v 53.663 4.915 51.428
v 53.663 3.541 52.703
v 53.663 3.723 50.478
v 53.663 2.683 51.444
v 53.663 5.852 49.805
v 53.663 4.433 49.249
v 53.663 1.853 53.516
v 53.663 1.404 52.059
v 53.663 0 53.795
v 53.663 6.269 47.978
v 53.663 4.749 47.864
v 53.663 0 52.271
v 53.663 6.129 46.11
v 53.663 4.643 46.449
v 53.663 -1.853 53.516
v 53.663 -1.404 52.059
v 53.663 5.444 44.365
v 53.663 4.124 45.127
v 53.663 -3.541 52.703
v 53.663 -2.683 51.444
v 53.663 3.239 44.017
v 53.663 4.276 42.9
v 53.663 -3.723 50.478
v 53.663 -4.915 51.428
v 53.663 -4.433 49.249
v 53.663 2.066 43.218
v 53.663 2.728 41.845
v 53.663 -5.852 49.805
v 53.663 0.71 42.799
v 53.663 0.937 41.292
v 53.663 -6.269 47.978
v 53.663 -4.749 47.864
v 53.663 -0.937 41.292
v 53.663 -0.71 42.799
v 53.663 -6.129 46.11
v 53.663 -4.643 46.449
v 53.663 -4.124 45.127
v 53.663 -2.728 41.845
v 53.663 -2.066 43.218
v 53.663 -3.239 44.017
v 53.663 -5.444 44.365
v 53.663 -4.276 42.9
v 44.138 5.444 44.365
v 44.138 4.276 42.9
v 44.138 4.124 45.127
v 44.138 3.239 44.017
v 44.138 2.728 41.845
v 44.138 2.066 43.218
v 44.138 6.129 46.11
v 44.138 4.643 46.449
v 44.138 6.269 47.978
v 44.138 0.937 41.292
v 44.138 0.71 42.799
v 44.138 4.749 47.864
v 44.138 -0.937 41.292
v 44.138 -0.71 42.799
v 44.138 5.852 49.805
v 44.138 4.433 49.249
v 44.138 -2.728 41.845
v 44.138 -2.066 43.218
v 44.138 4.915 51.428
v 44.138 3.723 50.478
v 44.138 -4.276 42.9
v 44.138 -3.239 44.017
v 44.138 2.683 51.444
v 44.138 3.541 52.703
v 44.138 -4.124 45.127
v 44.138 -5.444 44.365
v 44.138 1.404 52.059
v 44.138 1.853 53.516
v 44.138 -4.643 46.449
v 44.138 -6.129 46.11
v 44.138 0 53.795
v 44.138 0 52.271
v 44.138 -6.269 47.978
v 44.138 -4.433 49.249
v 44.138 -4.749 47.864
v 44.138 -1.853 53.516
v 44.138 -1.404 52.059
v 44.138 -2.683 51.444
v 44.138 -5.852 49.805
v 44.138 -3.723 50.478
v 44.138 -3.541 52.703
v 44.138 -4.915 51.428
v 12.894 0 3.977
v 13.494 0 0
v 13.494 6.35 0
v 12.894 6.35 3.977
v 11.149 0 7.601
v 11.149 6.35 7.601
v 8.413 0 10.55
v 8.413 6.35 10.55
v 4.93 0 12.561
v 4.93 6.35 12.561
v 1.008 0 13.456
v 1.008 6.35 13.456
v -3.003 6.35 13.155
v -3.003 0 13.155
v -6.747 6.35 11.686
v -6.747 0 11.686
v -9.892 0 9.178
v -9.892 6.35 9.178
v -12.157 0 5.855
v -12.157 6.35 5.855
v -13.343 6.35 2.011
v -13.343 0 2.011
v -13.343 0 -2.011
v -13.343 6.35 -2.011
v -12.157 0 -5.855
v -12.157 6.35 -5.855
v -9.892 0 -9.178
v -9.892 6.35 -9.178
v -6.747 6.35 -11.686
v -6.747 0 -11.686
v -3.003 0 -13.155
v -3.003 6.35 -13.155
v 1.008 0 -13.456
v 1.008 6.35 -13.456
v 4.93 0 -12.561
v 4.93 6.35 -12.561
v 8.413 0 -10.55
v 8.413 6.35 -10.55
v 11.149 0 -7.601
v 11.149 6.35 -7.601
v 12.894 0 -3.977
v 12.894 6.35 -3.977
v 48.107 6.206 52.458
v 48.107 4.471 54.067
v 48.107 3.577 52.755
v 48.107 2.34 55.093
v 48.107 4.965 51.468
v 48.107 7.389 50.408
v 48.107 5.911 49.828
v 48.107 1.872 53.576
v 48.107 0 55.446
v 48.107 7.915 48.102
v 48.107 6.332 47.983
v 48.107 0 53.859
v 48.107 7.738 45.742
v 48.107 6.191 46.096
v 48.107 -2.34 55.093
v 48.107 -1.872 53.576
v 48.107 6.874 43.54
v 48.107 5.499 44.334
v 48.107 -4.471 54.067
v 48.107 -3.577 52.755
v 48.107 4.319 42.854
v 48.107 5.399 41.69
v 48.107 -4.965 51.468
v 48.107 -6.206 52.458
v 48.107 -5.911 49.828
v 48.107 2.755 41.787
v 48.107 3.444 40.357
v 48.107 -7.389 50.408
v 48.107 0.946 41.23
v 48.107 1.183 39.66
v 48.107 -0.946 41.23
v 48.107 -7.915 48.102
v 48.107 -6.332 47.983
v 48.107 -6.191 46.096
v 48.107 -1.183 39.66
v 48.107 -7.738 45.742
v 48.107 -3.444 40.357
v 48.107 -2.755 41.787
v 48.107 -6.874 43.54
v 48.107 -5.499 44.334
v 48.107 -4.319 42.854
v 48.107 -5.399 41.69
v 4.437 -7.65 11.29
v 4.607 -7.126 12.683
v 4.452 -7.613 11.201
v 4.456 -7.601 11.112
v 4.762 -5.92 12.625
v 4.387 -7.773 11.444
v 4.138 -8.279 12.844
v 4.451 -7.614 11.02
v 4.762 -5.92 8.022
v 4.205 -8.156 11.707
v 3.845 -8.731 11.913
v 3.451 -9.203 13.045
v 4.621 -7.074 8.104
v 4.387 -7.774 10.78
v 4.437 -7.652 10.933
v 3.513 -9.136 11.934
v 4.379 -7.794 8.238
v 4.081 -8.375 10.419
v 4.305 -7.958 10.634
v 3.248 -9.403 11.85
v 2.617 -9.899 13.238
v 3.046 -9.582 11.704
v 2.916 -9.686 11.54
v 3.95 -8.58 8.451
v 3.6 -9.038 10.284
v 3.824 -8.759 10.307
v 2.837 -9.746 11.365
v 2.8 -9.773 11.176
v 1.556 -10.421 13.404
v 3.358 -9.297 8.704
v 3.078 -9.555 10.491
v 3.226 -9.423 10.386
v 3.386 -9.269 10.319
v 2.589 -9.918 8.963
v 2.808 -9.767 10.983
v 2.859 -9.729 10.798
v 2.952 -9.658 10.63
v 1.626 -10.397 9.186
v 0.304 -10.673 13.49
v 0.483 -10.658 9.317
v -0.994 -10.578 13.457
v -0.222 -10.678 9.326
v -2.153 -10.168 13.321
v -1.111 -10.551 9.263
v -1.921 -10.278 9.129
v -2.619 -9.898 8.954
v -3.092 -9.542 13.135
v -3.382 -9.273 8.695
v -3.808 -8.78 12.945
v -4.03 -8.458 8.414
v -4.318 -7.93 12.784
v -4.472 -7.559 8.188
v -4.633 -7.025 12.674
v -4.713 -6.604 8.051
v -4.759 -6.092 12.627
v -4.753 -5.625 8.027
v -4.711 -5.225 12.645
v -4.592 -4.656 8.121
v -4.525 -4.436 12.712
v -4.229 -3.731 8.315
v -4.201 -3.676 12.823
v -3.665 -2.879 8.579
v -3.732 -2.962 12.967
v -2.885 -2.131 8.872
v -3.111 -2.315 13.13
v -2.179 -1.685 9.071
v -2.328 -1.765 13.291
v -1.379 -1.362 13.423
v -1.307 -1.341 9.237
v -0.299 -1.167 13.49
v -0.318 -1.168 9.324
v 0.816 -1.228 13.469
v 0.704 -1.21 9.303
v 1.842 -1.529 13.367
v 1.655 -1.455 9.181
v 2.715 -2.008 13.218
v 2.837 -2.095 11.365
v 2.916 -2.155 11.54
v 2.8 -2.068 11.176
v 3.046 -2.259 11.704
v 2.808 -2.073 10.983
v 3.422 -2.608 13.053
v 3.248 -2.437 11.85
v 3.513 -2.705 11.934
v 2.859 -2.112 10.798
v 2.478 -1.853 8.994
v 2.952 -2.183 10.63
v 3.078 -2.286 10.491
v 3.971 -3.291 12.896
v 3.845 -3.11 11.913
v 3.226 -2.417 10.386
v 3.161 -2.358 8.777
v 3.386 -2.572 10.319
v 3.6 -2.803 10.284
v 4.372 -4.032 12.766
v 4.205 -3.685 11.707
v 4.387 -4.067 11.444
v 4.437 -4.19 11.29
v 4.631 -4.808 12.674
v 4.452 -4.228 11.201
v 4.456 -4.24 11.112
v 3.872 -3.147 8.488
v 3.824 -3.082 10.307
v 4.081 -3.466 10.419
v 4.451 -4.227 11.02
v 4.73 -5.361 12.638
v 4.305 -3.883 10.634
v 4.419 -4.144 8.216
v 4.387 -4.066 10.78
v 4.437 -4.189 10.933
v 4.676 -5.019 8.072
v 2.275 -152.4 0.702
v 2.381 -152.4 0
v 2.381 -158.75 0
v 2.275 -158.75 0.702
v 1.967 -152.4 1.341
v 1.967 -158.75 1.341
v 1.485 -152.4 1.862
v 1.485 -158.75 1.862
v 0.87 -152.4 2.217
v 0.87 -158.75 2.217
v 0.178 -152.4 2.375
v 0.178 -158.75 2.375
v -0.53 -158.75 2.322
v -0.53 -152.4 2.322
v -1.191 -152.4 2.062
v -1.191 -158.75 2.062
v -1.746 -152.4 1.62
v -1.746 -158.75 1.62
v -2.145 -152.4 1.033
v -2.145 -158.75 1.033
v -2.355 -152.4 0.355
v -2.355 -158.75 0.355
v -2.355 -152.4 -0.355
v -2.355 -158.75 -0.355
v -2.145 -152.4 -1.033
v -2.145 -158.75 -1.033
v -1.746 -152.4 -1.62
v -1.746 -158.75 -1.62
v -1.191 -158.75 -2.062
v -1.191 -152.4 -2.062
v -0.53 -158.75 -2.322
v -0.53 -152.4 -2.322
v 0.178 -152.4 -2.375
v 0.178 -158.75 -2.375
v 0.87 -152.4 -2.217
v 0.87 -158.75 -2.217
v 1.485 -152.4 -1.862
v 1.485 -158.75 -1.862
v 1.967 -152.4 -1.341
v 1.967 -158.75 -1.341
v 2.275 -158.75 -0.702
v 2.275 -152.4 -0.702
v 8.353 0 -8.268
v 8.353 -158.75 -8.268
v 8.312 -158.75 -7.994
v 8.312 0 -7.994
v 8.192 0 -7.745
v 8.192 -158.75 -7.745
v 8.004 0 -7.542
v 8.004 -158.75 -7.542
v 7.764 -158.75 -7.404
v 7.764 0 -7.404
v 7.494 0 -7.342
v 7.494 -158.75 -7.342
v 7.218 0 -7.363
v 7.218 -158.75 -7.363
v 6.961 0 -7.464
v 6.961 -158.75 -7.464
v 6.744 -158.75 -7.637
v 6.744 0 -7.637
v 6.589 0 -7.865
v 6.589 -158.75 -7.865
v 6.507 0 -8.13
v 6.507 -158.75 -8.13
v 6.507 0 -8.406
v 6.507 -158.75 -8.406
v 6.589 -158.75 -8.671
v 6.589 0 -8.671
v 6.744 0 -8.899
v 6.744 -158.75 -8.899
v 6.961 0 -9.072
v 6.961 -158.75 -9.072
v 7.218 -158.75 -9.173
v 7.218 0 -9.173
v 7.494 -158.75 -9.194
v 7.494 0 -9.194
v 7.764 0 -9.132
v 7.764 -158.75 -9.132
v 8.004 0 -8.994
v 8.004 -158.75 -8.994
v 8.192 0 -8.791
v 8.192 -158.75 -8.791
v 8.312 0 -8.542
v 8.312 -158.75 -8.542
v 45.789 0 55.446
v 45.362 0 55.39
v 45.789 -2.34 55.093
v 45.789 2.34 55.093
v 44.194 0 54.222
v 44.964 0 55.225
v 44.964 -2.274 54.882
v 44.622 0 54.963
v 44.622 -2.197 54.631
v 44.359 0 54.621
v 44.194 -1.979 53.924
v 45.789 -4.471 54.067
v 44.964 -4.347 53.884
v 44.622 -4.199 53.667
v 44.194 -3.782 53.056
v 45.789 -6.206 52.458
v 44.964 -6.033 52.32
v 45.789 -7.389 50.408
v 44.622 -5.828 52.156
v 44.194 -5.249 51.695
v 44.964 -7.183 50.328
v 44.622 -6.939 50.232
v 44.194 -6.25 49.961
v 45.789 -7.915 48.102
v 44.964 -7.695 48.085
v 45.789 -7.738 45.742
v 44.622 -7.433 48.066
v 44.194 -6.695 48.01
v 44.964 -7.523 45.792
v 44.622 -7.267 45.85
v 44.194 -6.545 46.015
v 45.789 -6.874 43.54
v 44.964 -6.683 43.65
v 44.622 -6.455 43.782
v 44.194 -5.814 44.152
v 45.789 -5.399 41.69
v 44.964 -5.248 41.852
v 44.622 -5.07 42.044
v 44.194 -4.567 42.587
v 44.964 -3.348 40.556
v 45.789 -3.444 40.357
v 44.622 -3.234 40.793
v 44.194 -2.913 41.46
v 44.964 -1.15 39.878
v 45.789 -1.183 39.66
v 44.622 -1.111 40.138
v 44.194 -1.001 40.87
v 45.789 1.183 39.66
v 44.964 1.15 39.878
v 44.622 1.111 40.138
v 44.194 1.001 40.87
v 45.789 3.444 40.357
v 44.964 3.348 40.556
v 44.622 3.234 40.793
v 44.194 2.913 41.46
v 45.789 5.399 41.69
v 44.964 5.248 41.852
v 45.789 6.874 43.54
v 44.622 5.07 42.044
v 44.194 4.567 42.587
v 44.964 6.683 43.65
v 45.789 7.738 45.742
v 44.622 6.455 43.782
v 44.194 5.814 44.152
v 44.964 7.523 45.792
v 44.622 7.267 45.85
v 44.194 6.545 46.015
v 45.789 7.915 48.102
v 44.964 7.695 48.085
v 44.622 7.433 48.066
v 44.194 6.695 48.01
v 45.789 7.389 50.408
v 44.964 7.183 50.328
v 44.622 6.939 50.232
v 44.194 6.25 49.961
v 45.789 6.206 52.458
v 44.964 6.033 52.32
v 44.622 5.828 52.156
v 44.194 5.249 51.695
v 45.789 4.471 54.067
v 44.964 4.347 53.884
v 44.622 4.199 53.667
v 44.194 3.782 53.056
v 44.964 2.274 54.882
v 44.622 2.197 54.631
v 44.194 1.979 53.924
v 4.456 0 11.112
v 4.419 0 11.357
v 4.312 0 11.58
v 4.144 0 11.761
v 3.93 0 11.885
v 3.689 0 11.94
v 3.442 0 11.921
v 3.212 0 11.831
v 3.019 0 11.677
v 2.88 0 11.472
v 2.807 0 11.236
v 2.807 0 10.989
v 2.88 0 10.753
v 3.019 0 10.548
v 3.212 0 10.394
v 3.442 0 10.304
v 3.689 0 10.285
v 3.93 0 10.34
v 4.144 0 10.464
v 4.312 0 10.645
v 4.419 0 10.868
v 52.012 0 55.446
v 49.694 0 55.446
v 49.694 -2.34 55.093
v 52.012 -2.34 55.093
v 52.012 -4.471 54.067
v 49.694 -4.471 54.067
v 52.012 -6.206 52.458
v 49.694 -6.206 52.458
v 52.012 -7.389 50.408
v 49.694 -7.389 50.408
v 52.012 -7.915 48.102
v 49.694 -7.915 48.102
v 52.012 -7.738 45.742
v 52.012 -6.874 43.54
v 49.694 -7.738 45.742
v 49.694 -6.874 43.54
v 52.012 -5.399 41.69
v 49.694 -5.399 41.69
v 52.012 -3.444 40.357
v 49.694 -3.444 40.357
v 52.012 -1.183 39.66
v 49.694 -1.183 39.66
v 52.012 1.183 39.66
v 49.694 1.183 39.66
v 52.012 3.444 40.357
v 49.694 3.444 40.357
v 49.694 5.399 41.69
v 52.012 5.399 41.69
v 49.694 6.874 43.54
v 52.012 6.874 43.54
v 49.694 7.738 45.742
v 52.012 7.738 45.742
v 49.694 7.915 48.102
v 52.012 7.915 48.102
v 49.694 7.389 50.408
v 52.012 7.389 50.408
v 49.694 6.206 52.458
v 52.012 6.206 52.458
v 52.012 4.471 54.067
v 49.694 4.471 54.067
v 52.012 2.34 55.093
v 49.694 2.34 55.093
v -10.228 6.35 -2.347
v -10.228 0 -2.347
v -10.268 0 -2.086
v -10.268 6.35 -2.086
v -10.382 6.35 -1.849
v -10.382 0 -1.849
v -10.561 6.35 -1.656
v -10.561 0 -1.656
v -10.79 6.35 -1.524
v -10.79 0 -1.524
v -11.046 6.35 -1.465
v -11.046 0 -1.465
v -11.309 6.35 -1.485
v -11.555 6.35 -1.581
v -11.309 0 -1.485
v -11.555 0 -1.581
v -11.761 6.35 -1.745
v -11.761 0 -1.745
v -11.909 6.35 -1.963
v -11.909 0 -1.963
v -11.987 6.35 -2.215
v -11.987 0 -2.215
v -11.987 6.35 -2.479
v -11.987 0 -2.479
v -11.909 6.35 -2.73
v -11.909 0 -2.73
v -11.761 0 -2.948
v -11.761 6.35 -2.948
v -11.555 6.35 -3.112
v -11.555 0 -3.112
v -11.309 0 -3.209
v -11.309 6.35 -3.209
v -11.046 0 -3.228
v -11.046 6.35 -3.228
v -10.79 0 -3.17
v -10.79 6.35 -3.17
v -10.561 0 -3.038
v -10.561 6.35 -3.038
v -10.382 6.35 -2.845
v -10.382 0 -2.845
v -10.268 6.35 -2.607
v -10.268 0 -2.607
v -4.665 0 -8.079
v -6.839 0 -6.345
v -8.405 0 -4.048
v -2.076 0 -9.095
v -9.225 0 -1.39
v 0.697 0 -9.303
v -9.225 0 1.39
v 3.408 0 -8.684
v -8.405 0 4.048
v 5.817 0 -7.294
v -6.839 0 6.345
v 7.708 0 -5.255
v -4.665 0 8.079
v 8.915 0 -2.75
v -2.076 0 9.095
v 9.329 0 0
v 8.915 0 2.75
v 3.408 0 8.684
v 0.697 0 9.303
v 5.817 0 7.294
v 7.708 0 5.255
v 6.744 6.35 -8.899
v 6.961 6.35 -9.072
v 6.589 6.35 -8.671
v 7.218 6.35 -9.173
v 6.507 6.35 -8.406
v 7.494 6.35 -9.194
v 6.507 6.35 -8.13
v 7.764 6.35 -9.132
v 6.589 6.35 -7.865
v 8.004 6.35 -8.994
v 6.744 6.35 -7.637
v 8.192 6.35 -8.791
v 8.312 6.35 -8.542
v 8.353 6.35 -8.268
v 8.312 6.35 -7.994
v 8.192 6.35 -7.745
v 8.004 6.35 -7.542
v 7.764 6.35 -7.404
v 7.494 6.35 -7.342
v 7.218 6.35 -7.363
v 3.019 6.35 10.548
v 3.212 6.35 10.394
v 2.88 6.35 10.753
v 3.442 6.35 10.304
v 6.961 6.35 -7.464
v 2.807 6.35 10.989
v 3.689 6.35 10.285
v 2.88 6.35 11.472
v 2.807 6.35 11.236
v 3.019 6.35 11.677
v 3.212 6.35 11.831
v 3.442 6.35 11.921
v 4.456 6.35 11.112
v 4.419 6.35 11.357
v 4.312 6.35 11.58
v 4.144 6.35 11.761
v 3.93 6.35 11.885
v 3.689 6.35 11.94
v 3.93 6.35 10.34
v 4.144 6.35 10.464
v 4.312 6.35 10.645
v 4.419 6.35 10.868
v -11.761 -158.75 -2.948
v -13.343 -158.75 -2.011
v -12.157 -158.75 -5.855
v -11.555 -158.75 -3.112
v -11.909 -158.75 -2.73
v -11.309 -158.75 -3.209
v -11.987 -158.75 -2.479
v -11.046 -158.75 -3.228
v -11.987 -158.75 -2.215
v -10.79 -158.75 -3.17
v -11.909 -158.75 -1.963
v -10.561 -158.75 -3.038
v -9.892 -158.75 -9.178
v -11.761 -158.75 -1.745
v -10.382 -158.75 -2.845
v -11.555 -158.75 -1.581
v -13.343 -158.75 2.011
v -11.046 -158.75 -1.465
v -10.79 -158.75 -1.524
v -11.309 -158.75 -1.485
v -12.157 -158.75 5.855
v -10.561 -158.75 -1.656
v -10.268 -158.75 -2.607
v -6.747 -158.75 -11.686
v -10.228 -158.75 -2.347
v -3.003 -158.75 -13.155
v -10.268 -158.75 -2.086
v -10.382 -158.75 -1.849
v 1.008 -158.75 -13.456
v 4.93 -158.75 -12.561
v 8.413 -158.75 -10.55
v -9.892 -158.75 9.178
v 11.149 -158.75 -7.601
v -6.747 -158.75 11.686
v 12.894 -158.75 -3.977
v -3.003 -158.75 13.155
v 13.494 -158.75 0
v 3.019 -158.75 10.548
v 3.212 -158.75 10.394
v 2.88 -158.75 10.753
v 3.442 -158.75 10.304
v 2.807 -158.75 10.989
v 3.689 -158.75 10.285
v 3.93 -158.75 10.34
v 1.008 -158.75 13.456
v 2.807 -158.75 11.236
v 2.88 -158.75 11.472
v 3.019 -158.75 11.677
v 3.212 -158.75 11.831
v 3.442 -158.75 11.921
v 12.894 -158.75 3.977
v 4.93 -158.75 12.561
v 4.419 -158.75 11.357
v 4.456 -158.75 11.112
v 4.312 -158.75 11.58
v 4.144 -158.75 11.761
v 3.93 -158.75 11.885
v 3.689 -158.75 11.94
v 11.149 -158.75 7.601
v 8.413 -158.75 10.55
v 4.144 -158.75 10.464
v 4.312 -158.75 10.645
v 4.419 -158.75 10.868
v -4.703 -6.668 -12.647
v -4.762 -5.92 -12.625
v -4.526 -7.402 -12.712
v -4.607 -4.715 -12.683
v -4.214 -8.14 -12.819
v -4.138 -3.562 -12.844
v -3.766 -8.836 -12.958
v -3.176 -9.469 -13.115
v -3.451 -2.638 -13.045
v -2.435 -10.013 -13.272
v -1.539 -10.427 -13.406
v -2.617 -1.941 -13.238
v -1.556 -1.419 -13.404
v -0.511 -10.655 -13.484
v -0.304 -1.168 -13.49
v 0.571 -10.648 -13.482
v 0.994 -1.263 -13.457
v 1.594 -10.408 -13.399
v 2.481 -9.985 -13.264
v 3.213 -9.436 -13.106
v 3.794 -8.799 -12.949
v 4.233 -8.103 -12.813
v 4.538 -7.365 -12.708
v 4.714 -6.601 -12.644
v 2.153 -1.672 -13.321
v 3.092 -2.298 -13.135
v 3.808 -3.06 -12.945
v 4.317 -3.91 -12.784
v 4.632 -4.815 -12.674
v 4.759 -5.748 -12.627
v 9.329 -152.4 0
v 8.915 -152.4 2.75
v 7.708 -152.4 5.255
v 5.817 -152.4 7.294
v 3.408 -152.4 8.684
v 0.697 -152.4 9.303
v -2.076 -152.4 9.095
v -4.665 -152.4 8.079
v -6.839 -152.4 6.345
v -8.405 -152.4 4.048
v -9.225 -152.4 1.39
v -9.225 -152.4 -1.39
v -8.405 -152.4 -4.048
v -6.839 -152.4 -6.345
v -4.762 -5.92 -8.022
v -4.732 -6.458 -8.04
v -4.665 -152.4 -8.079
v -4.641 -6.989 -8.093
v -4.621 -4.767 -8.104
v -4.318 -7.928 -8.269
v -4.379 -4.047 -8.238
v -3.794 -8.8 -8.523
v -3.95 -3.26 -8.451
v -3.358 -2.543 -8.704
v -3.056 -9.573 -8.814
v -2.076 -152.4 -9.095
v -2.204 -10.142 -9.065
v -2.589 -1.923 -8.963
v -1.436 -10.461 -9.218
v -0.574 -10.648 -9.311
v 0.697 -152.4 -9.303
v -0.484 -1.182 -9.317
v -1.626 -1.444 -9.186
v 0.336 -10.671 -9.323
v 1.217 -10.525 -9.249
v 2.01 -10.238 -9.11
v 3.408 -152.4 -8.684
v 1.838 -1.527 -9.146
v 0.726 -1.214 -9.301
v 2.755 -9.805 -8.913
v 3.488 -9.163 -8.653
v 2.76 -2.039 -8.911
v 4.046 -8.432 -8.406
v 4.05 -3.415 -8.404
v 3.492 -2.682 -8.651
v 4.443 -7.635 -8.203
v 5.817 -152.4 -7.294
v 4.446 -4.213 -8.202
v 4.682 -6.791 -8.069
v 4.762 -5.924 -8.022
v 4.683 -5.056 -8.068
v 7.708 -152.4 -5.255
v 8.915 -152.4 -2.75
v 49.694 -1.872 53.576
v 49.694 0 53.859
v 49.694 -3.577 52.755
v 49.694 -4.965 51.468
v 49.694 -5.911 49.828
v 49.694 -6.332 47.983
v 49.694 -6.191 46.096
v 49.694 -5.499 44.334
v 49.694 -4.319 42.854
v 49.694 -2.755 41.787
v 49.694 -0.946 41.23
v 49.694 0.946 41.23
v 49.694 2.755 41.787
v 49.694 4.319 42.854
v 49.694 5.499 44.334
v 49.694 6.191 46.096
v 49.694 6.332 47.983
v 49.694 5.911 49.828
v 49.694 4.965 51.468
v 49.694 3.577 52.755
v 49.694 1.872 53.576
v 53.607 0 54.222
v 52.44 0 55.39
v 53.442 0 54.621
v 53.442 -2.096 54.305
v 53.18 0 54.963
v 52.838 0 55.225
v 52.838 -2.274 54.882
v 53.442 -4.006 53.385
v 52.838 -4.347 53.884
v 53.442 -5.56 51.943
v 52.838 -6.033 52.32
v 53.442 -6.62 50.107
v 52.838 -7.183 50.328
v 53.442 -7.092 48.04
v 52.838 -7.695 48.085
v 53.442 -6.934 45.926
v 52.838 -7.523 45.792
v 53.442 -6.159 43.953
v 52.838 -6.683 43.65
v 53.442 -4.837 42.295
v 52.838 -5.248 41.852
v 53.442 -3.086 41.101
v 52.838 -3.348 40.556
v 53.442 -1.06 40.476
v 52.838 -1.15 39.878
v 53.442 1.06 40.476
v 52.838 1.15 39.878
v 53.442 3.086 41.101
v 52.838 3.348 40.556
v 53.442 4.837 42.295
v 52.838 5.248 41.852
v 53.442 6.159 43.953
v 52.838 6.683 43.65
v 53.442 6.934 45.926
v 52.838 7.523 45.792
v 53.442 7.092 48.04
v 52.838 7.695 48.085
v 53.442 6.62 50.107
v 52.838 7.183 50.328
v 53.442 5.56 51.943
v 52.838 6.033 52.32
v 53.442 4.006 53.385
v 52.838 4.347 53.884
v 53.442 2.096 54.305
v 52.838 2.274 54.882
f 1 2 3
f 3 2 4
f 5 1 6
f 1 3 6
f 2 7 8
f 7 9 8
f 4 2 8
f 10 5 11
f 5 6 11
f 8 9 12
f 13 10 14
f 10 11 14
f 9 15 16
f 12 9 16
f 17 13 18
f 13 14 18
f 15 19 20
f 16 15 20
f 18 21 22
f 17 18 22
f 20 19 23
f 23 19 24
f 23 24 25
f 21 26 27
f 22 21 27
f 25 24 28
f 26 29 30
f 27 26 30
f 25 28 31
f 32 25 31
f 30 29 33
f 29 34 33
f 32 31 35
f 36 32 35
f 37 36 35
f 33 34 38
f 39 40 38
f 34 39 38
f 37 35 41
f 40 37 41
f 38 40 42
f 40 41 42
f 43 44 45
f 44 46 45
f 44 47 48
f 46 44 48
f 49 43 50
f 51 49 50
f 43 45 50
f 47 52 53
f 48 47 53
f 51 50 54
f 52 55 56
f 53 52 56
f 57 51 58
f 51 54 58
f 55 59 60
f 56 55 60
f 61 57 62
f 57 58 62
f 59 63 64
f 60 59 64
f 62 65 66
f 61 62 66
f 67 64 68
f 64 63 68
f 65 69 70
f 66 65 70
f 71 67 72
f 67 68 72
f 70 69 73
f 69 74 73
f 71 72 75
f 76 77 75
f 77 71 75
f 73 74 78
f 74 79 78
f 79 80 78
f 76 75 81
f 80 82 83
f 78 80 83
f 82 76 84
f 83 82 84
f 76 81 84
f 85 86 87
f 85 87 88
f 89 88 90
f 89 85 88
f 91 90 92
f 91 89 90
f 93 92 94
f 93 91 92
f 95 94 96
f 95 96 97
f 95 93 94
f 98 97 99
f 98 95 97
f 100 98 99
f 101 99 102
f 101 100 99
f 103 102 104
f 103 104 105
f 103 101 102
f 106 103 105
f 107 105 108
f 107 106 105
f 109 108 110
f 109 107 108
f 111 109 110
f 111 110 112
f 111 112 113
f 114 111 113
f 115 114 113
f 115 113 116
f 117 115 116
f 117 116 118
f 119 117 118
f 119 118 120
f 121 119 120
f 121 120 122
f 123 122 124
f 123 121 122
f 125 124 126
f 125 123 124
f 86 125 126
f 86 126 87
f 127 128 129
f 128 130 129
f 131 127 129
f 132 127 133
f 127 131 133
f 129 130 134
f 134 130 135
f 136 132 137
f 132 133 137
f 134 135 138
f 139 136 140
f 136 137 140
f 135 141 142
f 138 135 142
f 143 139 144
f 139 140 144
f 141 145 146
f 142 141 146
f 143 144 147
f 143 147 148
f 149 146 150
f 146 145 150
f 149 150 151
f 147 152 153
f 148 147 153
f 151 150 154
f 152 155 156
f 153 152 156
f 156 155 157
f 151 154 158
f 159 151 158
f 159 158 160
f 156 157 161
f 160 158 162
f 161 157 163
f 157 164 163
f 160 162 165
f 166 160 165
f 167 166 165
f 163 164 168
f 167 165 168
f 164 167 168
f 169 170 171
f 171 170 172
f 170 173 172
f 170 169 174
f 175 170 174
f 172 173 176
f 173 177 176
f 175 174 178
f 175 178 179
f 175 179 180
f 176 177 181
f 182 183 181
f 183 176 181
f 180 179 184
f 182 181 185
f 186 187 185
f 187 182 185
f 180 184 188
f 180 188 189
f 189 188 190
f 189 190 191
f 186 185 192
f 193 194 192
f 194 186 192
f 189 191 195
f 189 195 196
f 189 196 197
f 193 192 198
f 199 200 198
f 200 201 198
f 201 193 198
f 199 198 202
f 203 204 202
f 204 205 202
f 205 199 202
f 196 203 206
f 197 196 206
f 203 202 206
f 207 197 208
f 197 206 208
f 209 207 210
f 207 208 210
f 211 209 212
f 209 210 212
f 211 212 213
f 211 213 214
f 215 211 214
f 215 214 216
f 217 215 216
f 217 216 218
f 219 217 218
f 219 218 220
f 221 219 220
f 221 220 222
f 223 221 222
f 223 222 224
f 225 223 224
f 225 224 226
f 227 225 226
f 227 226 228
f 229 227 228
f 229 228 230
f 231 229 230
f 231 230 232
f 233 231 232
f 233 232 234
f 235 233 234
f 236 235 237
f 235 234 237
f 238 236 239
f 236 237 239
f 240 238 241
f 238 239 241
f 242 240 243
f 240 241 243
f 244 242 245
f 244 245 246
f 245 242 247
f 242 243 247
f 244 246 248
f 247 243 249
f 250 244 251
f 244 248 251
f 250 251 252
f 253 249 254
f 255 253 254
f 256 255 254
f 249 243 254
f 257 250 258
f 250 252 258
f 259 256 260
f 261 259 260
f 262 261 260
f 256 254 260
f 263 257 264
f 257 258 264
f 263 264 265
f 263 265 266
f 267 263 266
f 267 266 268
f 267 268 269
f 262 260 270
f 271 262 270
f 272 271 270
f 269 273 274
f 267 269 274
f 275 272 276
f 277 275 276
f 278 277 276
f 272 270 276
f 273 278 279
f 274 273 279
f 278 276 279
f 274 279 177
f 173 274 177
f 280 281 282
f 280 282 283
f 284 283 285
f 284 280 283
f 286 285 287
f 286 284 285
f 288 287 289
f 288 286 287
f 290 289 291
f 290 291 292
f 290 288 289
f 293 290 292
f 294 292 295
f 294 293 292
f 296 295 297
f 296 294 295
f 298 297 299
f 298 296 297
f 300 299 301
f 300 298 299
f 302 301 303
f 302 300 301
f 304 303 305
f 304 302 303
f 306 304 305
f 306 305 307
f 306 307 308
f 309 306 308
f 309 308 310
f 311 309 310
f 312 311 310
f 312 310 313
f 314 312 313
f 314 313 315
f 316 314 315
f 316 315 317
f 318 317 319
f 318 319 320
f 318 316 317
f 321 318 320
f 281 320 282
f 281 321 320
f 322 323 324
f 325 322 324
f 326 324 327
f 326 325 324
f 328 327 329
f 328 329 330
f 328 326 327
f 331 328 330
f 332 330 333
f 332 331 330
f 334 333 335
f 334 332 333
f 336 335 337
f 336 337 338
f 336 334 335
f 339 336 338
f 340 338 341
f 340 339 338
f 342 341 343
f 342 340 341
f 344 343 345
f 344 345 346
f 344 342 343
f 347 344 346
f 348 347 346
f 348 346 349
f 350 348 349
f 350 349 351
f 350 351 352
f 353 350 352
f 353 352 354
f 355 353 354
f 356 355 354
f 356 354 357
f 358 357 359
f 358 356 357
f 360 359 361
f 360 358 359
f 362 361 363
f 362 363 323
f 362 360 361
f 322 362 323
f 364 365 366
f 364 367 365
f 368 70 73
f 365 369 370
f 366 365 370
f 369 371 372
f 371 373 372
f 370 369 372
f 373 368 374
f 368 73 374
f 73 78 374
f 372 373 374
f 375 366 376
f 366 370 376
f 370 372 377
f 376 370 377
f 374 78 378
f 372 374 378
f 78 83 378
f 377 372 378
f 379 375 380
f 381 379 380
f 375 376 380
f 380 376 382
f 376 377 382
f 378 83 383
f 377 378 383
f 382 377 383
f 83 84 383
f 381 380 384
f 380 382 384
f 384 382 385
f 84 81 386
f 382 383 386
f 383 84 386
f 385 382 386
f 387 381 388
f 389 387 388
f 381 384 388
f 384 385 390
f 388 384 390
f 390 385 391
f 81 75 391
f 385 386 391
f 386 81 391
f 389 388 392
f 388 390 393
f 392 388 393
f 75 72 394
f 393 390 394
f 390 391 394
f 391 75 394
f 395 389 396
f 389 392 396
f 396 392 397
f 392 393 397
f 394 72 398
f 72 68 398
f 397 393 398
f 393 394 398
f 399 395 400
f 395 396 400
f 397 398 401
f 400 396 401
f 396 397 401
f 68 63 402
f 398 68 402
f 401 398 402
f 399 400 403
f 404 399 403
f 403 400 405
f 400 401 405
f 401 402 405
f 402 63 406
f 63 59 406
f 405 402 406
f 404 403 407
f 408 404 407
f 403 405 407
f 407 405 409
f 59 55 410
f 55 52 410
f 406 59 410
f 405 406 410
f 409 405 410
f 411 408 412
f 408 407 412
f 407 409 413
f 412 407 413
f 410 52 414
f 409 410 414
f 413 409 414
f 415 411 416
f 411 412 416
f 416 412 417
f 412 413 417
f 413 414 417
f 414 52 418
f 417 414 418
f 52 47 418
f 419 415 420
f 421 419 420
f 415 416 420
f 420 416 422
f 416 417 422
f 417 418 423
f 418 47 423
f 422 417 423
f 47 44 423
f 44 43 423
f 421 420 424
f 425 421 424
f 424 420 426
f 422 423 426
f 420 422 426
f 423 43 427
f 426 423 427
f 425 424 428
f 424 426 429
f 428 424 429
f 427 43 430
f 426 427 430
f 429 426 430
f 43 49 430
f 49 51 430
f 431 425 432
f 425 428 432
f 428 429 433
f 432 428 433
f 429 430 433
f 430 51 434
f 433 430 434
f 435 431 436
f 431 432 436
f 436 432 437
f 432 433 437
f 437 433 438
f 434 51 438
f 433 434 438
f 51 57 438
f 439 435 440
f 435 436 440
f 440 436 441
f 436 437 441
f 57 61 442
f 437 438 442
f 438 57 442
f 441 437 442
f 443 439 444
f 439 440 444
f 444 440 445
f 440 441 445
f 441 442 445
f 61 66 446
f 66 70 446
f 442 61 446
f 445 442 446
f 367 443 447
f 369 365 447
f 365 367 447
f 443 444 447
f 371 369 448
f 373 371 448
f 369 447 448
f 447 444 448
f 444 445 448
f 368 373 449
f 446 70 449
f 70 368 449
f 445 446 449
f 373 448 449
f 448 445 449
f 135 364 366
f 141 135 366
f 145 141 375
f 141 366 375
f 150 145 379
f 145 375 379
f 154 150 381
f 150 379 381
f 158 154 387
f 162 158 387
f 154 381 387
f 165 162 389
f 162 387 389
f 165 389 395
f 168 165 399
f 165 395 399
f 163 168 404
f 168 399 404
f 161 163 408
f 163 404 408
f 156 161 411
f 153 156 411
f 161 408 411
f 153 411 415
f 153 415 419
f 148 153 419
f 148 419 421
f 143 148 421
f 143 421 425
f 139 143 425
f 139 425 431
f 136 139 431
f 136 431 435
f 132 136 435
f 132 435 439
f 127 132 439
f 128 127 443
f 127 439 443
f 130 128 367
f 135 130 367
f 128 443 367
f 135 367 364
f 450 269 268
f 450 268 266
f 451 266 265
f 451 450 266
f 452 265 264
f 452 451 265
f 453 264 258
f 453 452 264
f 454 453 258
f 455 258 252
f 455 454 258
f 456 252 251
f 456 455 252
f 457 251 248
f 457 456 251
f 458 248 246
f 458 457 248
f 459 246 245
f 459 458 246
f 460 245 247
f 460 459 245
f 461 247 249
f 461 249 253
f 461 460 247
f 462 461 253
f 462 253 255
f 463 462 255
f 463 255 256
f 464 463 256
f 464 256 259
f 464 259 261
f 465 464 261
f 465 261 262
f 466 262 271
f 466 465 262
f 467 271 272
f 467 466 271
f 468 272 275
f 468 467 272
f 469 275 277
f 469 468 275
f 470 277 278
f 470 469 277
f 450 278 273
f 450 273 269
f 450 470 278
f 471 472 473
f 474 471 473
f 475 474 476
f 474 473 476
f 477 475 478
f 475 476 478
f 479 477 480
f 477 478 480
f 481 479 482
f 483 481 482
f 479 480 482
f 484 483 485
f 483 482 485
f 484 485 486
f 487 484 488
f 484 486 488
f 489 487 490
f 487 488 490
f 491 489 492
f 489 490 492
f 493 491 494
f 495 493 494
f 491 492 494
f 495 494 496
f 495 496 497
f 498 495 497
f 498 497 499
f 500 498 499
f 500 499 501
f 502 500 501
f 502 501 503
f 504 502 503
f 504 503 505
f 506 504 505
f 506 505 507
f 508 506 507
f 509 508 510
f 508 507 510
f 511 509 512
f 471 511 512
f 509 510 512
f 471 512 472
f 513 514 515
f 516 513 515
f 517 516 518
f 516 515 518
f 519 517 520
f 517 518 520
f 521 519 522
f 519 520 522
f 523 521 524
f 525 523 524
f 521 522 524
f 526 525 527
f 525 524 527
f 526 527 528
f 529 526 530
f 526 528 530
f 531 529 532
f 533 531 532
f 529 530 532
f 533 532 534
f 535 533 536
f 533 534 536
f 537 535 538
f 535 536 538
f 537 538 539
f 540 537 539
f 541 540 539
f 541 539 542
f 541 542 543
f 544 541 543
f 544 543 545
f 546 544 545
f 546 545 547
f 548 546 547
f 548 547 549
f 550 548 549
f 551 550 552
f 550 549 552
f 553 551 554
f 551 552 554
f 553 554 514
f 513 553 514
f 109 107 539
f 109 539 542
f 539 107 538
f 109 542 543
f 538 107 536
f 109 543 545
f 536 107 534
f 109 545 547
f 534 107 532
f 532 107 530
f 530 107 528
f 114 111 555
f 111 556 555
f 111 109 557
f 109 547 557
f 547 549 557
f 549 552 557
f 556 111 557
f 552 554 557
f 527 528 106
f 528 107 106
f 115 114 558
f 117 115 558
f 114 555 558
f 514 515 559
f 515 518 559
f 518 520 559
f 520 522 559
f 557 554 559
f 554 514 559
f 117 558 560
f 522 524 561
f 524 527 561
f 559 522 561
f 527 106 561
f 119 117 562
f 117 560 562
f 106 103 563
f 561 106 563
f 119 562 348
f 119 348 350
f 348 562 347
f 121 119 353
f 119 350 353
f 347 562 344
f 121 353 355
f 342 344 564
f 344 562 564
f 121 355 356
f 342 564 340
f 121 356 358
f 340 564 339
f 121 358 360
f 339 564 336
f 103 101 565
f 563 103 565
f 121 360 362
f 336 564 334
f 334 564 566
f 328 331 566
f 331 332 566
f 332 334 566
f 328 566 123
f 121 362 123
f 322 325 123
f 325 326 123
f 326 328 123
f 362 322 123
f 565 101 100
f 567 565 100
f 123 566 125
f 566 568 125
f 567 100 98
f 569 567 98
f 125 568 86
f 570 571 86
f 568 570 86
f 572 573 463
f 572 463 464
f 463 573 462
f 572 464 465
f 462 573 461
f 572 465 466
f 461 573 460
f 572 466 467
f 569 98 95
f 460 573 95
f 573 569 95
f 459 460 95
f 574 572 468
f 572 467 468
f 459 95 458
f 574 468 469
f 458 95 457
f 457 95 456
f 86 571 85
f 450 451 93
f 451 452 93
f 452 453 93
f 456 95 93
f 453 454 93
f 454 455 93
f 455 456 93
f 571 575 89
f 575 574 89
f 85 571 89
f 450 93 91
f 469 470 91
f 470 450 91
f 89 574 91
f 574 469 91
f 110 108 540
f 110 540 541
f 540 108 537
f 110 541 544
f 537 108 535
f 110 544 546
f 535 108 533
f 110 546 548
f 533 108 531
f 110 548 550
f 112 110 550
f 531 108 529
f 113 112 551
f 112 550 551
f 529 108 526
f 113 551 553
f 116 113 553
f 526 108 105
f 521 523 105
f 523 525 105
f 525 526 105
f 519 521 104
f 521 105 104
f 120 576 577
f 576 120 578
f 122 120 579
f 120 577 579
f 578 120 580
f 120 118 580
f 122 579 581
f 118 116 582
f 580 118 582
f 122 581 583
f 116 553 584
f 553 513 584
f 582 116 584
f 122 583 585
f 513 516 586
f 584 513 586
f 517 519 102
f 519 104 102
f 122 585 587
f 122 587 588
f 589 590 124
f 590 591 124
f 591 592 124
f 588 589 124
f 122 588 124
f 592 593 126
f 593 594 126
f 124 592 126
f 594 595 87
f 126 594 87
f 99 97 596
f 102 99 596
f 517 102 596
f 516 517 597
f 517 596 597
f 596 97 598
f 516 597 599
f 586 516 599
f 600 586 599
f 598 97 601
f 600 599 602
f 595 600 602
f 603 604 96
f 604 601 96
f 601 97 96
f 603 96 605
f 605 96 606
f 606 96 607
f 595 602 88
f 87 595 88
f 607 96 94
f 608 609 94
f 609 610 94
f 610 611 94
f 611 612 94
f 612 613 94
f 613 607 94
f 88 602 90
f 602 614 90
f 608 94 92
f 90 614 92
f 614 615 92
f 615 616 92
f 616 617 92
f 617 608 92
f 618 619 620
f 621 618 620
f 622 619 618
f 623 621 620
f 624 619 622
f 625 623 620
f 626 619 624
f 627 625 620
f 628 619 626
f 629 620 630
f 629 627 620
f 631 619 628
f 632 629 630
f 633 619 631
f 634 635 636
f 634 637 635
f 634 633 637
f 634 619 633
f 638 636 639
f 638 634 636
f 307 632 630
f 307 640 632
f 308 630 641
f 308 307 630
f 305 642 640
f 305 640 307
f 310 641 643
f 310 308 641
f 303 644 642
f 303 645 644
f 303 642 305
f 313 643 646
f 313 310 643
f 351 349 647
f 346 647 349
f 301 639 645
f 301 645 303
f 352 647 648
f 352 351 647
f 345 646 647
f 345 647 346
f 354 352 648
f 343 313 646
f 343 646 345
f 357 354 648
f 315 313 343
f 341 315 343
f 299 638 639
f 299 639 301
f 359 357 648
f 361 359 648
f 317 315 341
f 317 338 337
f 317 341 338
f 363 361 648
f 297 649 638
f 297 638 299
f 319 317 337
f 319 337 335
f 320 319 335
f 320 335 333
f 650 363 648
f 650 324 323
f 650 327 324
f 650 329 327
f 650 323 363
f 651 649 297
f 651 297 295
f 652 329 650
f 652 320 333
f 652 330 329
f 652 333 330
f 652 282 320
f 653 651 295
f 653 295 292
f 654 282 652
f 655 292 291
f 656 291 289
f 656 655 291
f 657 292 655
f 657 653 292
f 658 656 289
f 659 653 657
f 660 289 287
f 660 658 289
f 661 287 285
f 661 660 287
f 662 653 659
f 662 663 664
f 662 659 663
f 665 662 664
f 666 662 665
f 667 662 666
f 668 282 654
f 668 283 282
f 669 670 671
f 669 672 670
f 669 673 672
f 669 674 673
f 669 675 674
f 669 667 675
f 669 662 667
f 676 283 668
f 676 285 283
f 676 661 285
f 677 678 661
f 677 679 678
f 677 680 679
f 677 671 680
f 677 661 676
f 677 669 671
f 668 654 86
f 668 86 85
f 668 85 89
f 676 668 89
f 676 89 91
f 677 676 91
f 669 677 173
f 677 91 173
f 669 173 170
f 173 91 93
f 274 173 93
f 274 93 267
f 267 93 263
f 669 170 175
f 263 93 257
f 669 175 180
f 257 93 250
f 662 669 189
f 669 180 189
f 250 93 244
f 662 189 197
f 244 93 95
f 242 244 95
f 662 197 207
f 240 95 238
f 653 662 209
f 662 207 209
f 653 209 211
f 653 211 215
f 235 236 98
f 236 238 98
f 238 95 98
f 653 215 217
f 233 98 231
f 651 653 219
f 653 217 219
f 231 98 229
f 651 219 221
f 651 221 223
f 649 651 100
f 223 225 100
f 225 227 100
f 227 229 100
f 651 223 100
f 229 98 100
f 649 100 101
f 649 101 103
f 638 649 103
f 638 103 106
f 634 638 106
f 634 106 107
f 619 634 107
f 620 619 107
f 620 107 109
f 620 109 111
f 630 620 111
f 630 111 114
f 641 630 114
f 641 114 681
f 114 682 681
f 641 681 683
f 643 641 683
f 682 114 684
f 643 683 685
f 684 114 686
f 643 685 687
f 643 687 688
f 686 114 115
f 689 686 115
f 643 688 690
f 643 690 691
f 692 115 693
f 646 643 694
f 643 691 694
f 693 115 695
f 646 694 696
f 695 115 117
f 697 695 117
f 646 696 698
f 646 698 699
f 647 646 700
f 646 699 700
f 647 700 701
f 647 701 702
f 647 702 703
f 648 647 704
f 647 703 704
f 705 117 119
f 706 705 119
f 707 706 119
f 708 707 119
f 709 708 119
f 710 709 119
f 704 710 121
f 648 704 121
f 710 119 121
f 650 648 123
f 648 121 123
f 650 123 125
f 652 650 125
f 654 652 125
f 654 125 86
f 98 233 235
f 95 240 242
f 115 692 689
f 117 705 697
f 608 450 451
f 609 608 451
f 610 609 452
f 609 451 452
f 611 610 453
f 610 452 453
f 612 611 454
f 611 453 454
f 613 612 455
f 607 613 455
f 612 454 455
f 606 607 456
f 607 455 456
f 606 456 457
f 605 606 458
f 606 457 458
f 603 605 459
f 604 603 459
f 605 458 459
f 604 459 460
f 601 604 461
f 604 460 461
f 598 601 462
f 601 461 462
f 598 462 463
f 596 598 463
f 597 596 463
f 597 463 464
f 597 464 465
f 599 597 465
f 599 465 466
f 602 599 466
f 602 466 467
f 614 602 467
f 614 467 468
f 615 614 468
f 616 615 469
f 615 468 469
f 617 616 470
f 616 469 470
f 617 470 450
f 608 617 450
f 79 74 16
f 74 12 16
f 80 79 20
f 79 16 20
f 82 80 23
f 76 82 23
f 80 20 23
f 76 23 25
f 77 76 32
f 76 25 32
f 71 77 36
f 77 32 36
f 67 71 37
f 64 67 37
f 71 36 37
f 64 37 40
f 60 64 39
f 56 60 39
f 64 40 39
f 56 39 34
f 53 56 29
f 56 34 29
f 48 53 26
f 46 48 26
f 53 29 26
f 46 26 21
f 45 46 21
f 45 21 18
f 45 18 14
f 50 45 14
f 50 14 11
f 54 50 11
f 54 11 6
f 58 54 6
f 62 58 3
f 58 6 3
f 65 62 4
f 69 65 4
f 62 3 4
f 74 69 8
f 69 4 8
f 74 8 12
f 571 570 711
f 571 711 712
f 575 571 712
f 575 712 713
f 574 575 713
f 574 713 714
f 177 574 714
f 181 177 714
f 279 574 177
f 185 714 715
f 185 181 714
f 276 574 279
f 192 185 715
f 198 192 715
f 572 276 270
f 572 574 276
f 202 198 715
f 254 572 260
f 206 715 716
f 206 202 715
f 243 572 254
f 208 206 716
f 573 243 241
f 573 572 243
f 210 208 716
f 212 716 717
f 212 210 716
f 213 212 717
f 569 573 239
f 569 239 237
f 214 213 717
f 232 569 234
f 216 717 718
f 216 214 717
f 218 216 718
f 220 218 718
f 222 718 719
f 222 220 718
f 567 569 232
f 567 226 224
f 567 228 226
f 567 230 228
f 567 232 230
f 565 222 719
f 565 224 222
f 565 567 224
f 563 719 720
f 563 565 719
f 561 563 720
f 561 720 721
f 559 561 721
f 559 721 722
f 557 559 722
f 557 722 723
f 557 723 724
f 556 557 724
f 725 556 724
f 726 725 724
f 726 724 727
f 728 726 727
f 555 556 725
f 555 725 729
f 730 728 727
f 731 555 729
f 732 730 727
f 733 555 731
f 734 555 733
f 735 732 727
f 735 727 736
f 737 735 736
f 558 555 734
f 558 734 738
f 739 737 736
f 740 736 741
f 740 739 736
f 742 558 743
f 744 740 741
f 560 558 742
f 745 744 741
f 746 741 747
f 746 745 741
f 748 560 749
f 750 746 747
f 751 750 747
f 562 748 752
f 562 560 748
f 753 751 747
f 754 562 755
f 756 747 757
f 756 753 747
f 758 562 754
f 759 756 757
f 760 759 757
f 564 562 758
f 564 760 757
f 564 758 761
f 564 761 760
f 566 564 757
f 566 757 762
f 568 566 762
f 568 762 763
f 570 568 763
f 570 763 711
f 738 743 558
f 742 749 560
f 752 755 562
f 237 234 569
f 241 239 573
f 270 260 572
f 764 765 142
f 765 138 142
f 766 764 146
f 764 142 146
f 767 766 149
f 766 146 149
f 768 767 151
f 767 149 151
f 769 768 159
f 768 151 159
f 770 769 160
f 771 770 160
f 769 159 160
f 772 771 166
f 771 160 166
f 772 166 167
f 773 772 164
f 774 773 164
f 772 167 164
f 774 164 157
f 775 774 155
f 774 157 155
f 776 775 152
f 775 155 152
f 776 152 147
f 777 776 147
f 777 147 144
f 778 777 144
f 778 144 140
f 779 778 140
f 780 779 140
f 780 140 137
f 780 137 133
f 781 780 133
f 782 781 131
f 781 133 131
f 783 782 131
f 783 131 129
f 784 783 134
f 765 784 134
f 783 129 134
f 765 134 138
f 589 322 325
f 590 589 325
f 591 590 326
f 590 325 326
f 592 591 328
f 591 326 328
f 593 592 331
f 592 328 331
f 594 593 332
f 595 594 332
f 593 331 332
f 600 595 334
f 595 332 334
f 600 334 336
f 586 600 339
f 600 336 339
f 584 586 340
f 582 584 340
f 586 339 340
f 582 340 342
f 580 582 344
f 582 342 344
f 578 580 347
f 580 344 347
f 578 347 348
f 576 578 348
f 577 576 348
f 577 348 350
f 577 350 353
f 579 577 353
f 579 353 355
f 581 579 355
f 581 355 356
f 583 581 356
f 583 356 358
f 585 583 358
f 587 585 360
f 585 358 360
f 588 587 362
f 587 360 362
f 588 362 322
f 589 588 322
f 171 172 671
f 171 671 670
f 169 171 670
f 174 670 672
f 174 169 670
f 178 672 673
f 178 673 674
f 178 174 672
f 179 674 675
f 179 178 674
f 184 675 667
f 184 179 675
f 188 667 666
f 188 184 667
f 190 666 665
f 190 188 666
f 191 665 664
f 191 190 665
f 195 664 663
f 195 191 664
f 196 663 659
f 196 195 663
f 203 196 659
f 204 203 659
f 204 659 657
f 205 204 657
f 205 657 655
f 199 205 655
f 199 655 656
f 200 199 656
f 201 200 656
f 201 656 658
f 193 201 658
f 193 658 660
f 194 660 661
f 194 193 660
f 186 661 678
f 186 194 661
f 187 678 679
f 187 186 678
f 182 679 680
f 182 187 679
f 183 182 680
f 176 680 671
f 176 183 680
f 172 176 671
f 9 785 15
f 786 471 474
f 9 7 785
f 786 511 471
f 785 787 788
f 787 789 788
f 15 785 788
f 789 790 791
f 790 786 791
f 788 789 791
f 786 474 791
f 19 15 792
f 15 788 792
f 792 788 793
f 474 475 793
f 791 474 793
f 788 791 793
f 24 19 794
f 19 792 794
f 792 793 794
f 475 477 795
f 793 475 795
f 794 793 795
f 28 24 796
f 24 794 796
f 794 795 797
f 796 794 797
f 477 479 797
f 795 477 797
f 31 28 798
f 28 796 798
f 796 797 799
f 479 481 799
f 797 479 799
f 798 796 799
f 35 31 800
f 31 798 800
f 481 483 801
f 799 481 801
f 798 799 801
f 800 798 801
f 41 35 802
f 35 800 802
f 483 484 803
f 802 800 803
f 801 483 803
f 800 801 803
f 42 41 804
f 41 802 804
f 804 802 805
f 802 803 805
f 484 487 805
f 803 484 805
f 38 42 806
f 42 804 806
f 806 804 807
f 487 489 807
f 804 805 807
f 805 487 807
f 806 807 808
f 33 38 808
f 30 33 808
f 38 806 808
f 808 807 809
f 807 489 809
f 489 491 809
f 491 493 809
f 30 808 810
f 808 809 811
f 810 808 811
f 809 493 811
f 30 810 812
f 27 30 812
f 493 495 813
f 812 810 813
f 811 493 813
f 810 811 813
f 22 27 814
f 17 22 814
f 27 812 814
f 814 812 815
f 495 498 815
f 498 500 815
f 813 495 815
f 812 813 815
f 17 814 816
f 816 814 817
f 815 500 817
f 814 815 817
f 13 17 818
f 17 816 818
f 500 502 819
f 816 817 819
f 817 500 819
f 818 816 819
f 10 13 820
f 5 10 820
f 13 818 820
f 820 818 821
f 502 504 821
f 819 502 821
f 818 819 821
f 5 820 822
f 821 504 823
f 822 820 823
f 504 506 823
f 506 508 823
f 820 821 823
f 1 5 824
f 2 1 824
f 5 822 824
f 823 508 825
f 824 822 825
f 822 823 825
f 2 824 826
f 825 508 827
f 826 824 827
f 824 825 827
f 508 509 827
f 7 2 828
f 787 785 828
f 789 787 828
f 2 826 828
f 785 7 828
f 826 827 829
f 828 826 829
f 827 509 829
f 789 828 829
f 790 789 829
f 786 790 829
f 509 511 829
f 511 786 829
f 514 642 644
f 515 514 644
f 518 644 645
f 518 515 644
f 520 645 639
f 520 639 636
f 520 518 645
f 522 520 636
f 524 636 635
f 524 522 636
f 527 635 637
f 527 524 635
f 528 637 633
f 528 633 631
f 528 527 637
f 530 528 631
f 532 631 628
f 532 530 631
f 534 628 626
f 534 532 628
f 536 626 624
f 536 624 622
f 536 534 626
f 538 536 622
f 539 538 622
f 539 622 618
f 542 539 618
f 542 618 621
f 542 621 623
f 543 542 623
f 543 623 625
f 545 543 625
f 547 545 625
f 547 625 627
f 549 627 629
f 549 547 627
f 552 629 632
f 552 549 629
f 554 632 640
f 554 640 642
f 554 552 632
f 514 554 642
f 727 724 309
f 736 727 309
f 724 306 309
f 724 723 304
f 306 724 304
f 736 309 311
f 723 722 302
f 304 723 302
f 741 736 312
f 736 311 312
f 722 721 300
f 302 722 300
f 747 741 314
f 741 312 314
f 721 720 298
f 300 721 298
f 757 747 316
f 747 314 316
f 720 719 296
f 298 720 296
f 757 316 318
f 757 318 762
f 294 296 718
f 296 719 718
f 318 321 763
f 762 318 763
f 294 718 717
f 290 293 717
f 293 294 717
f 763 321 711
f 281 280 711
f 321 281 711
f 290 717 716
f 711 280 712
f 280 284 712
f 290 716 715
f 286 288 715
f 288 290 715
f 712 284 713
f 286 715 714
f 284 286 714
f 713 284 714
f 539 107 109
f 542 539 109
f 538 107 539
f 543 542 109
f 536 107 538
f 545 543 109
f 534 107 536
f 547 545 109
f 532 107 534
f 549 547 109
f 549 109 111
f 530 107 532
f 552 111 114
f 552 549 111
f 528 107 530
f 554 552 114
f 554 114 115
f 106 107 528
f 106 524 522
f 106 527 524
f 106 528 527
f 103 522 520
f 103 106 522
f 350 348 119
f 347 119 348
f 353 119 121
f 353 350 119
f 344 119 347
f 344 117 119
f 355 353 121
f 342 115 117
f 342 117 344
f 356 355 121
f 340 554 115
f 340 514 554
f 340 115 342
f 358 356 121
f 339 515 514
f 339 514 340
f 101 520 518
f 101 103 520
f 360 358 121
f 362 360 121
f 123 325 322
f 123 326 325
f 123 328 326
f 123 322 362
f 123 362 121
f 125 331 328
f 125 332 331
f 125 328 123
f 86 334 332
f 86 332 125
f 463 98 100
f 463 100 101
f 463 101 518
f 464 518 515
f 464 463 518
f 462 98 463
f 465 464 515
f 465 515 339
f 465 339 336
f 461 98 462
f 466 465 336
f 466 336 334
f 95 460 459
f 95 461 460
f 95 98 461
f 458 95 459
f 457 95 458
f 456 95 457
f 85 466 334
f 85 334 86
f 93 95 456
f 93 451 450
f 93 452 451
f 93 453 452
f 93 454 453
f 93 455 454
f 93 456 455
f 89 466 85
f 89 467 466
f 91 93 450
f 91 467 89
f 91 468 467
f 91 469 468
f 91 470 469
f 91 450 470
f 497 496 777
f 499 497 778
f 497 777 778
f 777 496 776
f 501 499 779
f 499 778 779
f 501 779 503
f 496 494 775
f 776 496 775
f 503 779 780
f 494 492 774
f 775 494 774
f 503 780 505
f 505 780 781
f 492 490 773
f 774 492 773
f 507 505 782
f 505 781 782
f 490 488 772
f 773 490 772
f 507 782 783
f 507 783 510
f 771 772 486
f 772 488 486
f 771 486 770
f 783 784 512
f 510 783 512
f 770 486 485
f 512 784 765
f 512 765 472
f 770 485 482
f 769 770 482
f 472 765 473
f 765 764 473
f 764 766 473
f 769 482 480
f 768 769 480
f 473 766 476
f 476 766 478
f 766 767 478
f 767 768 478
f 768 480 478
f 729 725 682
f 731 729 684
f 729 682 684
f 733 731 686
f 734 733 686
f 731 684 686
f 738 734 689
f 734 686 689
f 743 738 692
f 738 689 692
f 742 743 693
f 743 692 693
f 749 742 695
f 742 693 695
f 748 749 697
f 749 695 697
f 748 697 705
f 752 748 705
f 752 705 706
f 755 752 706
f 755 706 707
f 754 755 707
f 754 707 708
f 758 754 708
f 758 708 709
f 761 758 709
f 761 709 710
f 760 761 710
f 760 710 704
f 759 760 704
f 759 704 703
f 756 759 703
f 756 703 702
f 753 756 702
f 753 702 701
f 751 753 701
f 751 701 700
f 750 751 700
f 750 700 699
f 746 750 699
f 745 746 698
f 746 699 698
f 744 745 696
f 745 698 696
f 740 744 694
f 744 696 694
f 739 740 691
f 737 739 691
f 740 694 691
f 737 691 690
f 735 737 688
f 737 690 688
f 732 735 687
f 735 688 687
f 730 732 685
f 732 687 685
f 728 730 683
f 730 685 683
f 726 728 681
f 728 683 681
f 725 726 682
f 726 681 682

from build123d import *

# Parameters (mm, degrees)
F0_R     = 13.49375
F0_R_2   = 0.8840363217
F0_R_3   = 0.9282502006
F0_R_4   = 9.3291025
F0_R_5   = 0.8294111598
F1_DEPTH = 152.4
F2_DEPTH = 6.35
F3_R     = 13.49375
F3_R_2   = 0.8840363217
F3_R_3   = 0.9282502006
F3_R_4   = 9.3291025
F3_R_5   = 0.8294111598
F3_R_6   = 2.38125
F4_DEPTH = 6.35
F7_R     = 1.651
F9_D     = 9.525
F9_DEPTH = 13.49475
F10_D    = 9.525


with BuildPart() as f1:
    # F0 (on Front) → F1 (new body)
    with BuildSketch(Plane.XZ):
        Circle(F0_R)
        with Locations((-11.1125, -2.3467487006)):
            Circle(F0_R_2, mode=Mode.SUBTRACT)
        with Locations((7.4248356606, -8.2679786928)):
            Circle(F0_R_3, mode=Mode.SUBTRACT)
        Circle(F0_R_4, mode=Mode.SUBTRACT)
        with Locations((3.6268509209, 11.1125)):
            Circle(F0_R_5, mode=Mode.SUBTRACT)
    extrude(amount=F1_DEPTH)

    # F3 (on face) → F4 (join)
    with BuildSketch(Plane.XZ.offset(152.4)):
        Circle(F3_R)
        with Locations((-11.1125, -2.3467487006)):
            Circle(F3_R_2, mode=Mode.SUBTRACT)
        with Locations((7.4248356606, -8.2679786928)):
            Circle(F3_R_3, mode=Mode.SUBTRACT)
        Circle(F3_R_4, mode=Mode.SUBTRACT)
        with Locations((3.6268509209, 11.1125)):
            Circle(F3_R_5, mode=Mode.SUBTRACT)
        Circle(F3_R_4)
        Circle(F3_R_6, mode=Mode.SUBTRACT)
    extrude(amount=F4_DEPTH)

    # F9 (through all, one way)
    with BuildSketch(Plane(origin=(0, 0, 0), x_dir=(1, 0, 0), z_dir=(0, 0, -1))):
        with Locations((0, 5.9203383362)):
            Circle(F9_D / 2)
    extrude(amount=-F9_DEPTH, mode=Mode.SUBTRACT)

    # F10 (through all)
    with Locations(Plane.XY):
        with Locations((0, -5.9203383362)):
            Hole(F10_D / 2)


with BuildPart() as f2:
    # F0 (on Front) → F2 (new body)
    with BuildSketch(Plane.XZ):
        Circle(F0_R)
        with Locations((-11.1125, -2.3467487006)):
            Circle(F0_R_2, mode=Mode.SUBTRACT)
        with Locations((7.4248356606, -8.2679786928)):
            Circle(F0_R_3, mode=Mode.SUBTRACT)
        Circle(F0_R_4, mode=Mode.SUBTRACT)
        with Locations((3.6268509209, 11.1125)):
            Circle(F0_R_5, mode=Mode.SUBTRACT)
        Circle(F0_R_4)
    extrude(amount=-F2_DEPTH)


with BuildPart() as f6:
    # F5 (on Front) → F6 (revolve)
    with BuildSketch(Plane.XZ):
        Polygon((44.1381960511, 52.2710782051), (53.6631960511, 52.2710782051), (53.6631960511, 55.4460782051), (49.6944460511, 55.4460782051), (49.6944460511, 53.8585782051), (48.1069460511, 53.8585782051), (48.1069460511, 55.4460782051), (44.1381960511, 55.4460782051), align=None)
    revolve(axis=Axis((57.510222998, 0, 47.5085782051), (1, 0, 0)))

    # F7
    f7_edges = [f6.edges().sort_by_distance(p)[0] for p in [
        (44.138196, 0, 39.571078),
        (53.663196, 0, 39.571078),
    ]]
    fillet(f7_edges, radius=F7_R)


solid = Compound([f1.part, f2.part, f6.part])
